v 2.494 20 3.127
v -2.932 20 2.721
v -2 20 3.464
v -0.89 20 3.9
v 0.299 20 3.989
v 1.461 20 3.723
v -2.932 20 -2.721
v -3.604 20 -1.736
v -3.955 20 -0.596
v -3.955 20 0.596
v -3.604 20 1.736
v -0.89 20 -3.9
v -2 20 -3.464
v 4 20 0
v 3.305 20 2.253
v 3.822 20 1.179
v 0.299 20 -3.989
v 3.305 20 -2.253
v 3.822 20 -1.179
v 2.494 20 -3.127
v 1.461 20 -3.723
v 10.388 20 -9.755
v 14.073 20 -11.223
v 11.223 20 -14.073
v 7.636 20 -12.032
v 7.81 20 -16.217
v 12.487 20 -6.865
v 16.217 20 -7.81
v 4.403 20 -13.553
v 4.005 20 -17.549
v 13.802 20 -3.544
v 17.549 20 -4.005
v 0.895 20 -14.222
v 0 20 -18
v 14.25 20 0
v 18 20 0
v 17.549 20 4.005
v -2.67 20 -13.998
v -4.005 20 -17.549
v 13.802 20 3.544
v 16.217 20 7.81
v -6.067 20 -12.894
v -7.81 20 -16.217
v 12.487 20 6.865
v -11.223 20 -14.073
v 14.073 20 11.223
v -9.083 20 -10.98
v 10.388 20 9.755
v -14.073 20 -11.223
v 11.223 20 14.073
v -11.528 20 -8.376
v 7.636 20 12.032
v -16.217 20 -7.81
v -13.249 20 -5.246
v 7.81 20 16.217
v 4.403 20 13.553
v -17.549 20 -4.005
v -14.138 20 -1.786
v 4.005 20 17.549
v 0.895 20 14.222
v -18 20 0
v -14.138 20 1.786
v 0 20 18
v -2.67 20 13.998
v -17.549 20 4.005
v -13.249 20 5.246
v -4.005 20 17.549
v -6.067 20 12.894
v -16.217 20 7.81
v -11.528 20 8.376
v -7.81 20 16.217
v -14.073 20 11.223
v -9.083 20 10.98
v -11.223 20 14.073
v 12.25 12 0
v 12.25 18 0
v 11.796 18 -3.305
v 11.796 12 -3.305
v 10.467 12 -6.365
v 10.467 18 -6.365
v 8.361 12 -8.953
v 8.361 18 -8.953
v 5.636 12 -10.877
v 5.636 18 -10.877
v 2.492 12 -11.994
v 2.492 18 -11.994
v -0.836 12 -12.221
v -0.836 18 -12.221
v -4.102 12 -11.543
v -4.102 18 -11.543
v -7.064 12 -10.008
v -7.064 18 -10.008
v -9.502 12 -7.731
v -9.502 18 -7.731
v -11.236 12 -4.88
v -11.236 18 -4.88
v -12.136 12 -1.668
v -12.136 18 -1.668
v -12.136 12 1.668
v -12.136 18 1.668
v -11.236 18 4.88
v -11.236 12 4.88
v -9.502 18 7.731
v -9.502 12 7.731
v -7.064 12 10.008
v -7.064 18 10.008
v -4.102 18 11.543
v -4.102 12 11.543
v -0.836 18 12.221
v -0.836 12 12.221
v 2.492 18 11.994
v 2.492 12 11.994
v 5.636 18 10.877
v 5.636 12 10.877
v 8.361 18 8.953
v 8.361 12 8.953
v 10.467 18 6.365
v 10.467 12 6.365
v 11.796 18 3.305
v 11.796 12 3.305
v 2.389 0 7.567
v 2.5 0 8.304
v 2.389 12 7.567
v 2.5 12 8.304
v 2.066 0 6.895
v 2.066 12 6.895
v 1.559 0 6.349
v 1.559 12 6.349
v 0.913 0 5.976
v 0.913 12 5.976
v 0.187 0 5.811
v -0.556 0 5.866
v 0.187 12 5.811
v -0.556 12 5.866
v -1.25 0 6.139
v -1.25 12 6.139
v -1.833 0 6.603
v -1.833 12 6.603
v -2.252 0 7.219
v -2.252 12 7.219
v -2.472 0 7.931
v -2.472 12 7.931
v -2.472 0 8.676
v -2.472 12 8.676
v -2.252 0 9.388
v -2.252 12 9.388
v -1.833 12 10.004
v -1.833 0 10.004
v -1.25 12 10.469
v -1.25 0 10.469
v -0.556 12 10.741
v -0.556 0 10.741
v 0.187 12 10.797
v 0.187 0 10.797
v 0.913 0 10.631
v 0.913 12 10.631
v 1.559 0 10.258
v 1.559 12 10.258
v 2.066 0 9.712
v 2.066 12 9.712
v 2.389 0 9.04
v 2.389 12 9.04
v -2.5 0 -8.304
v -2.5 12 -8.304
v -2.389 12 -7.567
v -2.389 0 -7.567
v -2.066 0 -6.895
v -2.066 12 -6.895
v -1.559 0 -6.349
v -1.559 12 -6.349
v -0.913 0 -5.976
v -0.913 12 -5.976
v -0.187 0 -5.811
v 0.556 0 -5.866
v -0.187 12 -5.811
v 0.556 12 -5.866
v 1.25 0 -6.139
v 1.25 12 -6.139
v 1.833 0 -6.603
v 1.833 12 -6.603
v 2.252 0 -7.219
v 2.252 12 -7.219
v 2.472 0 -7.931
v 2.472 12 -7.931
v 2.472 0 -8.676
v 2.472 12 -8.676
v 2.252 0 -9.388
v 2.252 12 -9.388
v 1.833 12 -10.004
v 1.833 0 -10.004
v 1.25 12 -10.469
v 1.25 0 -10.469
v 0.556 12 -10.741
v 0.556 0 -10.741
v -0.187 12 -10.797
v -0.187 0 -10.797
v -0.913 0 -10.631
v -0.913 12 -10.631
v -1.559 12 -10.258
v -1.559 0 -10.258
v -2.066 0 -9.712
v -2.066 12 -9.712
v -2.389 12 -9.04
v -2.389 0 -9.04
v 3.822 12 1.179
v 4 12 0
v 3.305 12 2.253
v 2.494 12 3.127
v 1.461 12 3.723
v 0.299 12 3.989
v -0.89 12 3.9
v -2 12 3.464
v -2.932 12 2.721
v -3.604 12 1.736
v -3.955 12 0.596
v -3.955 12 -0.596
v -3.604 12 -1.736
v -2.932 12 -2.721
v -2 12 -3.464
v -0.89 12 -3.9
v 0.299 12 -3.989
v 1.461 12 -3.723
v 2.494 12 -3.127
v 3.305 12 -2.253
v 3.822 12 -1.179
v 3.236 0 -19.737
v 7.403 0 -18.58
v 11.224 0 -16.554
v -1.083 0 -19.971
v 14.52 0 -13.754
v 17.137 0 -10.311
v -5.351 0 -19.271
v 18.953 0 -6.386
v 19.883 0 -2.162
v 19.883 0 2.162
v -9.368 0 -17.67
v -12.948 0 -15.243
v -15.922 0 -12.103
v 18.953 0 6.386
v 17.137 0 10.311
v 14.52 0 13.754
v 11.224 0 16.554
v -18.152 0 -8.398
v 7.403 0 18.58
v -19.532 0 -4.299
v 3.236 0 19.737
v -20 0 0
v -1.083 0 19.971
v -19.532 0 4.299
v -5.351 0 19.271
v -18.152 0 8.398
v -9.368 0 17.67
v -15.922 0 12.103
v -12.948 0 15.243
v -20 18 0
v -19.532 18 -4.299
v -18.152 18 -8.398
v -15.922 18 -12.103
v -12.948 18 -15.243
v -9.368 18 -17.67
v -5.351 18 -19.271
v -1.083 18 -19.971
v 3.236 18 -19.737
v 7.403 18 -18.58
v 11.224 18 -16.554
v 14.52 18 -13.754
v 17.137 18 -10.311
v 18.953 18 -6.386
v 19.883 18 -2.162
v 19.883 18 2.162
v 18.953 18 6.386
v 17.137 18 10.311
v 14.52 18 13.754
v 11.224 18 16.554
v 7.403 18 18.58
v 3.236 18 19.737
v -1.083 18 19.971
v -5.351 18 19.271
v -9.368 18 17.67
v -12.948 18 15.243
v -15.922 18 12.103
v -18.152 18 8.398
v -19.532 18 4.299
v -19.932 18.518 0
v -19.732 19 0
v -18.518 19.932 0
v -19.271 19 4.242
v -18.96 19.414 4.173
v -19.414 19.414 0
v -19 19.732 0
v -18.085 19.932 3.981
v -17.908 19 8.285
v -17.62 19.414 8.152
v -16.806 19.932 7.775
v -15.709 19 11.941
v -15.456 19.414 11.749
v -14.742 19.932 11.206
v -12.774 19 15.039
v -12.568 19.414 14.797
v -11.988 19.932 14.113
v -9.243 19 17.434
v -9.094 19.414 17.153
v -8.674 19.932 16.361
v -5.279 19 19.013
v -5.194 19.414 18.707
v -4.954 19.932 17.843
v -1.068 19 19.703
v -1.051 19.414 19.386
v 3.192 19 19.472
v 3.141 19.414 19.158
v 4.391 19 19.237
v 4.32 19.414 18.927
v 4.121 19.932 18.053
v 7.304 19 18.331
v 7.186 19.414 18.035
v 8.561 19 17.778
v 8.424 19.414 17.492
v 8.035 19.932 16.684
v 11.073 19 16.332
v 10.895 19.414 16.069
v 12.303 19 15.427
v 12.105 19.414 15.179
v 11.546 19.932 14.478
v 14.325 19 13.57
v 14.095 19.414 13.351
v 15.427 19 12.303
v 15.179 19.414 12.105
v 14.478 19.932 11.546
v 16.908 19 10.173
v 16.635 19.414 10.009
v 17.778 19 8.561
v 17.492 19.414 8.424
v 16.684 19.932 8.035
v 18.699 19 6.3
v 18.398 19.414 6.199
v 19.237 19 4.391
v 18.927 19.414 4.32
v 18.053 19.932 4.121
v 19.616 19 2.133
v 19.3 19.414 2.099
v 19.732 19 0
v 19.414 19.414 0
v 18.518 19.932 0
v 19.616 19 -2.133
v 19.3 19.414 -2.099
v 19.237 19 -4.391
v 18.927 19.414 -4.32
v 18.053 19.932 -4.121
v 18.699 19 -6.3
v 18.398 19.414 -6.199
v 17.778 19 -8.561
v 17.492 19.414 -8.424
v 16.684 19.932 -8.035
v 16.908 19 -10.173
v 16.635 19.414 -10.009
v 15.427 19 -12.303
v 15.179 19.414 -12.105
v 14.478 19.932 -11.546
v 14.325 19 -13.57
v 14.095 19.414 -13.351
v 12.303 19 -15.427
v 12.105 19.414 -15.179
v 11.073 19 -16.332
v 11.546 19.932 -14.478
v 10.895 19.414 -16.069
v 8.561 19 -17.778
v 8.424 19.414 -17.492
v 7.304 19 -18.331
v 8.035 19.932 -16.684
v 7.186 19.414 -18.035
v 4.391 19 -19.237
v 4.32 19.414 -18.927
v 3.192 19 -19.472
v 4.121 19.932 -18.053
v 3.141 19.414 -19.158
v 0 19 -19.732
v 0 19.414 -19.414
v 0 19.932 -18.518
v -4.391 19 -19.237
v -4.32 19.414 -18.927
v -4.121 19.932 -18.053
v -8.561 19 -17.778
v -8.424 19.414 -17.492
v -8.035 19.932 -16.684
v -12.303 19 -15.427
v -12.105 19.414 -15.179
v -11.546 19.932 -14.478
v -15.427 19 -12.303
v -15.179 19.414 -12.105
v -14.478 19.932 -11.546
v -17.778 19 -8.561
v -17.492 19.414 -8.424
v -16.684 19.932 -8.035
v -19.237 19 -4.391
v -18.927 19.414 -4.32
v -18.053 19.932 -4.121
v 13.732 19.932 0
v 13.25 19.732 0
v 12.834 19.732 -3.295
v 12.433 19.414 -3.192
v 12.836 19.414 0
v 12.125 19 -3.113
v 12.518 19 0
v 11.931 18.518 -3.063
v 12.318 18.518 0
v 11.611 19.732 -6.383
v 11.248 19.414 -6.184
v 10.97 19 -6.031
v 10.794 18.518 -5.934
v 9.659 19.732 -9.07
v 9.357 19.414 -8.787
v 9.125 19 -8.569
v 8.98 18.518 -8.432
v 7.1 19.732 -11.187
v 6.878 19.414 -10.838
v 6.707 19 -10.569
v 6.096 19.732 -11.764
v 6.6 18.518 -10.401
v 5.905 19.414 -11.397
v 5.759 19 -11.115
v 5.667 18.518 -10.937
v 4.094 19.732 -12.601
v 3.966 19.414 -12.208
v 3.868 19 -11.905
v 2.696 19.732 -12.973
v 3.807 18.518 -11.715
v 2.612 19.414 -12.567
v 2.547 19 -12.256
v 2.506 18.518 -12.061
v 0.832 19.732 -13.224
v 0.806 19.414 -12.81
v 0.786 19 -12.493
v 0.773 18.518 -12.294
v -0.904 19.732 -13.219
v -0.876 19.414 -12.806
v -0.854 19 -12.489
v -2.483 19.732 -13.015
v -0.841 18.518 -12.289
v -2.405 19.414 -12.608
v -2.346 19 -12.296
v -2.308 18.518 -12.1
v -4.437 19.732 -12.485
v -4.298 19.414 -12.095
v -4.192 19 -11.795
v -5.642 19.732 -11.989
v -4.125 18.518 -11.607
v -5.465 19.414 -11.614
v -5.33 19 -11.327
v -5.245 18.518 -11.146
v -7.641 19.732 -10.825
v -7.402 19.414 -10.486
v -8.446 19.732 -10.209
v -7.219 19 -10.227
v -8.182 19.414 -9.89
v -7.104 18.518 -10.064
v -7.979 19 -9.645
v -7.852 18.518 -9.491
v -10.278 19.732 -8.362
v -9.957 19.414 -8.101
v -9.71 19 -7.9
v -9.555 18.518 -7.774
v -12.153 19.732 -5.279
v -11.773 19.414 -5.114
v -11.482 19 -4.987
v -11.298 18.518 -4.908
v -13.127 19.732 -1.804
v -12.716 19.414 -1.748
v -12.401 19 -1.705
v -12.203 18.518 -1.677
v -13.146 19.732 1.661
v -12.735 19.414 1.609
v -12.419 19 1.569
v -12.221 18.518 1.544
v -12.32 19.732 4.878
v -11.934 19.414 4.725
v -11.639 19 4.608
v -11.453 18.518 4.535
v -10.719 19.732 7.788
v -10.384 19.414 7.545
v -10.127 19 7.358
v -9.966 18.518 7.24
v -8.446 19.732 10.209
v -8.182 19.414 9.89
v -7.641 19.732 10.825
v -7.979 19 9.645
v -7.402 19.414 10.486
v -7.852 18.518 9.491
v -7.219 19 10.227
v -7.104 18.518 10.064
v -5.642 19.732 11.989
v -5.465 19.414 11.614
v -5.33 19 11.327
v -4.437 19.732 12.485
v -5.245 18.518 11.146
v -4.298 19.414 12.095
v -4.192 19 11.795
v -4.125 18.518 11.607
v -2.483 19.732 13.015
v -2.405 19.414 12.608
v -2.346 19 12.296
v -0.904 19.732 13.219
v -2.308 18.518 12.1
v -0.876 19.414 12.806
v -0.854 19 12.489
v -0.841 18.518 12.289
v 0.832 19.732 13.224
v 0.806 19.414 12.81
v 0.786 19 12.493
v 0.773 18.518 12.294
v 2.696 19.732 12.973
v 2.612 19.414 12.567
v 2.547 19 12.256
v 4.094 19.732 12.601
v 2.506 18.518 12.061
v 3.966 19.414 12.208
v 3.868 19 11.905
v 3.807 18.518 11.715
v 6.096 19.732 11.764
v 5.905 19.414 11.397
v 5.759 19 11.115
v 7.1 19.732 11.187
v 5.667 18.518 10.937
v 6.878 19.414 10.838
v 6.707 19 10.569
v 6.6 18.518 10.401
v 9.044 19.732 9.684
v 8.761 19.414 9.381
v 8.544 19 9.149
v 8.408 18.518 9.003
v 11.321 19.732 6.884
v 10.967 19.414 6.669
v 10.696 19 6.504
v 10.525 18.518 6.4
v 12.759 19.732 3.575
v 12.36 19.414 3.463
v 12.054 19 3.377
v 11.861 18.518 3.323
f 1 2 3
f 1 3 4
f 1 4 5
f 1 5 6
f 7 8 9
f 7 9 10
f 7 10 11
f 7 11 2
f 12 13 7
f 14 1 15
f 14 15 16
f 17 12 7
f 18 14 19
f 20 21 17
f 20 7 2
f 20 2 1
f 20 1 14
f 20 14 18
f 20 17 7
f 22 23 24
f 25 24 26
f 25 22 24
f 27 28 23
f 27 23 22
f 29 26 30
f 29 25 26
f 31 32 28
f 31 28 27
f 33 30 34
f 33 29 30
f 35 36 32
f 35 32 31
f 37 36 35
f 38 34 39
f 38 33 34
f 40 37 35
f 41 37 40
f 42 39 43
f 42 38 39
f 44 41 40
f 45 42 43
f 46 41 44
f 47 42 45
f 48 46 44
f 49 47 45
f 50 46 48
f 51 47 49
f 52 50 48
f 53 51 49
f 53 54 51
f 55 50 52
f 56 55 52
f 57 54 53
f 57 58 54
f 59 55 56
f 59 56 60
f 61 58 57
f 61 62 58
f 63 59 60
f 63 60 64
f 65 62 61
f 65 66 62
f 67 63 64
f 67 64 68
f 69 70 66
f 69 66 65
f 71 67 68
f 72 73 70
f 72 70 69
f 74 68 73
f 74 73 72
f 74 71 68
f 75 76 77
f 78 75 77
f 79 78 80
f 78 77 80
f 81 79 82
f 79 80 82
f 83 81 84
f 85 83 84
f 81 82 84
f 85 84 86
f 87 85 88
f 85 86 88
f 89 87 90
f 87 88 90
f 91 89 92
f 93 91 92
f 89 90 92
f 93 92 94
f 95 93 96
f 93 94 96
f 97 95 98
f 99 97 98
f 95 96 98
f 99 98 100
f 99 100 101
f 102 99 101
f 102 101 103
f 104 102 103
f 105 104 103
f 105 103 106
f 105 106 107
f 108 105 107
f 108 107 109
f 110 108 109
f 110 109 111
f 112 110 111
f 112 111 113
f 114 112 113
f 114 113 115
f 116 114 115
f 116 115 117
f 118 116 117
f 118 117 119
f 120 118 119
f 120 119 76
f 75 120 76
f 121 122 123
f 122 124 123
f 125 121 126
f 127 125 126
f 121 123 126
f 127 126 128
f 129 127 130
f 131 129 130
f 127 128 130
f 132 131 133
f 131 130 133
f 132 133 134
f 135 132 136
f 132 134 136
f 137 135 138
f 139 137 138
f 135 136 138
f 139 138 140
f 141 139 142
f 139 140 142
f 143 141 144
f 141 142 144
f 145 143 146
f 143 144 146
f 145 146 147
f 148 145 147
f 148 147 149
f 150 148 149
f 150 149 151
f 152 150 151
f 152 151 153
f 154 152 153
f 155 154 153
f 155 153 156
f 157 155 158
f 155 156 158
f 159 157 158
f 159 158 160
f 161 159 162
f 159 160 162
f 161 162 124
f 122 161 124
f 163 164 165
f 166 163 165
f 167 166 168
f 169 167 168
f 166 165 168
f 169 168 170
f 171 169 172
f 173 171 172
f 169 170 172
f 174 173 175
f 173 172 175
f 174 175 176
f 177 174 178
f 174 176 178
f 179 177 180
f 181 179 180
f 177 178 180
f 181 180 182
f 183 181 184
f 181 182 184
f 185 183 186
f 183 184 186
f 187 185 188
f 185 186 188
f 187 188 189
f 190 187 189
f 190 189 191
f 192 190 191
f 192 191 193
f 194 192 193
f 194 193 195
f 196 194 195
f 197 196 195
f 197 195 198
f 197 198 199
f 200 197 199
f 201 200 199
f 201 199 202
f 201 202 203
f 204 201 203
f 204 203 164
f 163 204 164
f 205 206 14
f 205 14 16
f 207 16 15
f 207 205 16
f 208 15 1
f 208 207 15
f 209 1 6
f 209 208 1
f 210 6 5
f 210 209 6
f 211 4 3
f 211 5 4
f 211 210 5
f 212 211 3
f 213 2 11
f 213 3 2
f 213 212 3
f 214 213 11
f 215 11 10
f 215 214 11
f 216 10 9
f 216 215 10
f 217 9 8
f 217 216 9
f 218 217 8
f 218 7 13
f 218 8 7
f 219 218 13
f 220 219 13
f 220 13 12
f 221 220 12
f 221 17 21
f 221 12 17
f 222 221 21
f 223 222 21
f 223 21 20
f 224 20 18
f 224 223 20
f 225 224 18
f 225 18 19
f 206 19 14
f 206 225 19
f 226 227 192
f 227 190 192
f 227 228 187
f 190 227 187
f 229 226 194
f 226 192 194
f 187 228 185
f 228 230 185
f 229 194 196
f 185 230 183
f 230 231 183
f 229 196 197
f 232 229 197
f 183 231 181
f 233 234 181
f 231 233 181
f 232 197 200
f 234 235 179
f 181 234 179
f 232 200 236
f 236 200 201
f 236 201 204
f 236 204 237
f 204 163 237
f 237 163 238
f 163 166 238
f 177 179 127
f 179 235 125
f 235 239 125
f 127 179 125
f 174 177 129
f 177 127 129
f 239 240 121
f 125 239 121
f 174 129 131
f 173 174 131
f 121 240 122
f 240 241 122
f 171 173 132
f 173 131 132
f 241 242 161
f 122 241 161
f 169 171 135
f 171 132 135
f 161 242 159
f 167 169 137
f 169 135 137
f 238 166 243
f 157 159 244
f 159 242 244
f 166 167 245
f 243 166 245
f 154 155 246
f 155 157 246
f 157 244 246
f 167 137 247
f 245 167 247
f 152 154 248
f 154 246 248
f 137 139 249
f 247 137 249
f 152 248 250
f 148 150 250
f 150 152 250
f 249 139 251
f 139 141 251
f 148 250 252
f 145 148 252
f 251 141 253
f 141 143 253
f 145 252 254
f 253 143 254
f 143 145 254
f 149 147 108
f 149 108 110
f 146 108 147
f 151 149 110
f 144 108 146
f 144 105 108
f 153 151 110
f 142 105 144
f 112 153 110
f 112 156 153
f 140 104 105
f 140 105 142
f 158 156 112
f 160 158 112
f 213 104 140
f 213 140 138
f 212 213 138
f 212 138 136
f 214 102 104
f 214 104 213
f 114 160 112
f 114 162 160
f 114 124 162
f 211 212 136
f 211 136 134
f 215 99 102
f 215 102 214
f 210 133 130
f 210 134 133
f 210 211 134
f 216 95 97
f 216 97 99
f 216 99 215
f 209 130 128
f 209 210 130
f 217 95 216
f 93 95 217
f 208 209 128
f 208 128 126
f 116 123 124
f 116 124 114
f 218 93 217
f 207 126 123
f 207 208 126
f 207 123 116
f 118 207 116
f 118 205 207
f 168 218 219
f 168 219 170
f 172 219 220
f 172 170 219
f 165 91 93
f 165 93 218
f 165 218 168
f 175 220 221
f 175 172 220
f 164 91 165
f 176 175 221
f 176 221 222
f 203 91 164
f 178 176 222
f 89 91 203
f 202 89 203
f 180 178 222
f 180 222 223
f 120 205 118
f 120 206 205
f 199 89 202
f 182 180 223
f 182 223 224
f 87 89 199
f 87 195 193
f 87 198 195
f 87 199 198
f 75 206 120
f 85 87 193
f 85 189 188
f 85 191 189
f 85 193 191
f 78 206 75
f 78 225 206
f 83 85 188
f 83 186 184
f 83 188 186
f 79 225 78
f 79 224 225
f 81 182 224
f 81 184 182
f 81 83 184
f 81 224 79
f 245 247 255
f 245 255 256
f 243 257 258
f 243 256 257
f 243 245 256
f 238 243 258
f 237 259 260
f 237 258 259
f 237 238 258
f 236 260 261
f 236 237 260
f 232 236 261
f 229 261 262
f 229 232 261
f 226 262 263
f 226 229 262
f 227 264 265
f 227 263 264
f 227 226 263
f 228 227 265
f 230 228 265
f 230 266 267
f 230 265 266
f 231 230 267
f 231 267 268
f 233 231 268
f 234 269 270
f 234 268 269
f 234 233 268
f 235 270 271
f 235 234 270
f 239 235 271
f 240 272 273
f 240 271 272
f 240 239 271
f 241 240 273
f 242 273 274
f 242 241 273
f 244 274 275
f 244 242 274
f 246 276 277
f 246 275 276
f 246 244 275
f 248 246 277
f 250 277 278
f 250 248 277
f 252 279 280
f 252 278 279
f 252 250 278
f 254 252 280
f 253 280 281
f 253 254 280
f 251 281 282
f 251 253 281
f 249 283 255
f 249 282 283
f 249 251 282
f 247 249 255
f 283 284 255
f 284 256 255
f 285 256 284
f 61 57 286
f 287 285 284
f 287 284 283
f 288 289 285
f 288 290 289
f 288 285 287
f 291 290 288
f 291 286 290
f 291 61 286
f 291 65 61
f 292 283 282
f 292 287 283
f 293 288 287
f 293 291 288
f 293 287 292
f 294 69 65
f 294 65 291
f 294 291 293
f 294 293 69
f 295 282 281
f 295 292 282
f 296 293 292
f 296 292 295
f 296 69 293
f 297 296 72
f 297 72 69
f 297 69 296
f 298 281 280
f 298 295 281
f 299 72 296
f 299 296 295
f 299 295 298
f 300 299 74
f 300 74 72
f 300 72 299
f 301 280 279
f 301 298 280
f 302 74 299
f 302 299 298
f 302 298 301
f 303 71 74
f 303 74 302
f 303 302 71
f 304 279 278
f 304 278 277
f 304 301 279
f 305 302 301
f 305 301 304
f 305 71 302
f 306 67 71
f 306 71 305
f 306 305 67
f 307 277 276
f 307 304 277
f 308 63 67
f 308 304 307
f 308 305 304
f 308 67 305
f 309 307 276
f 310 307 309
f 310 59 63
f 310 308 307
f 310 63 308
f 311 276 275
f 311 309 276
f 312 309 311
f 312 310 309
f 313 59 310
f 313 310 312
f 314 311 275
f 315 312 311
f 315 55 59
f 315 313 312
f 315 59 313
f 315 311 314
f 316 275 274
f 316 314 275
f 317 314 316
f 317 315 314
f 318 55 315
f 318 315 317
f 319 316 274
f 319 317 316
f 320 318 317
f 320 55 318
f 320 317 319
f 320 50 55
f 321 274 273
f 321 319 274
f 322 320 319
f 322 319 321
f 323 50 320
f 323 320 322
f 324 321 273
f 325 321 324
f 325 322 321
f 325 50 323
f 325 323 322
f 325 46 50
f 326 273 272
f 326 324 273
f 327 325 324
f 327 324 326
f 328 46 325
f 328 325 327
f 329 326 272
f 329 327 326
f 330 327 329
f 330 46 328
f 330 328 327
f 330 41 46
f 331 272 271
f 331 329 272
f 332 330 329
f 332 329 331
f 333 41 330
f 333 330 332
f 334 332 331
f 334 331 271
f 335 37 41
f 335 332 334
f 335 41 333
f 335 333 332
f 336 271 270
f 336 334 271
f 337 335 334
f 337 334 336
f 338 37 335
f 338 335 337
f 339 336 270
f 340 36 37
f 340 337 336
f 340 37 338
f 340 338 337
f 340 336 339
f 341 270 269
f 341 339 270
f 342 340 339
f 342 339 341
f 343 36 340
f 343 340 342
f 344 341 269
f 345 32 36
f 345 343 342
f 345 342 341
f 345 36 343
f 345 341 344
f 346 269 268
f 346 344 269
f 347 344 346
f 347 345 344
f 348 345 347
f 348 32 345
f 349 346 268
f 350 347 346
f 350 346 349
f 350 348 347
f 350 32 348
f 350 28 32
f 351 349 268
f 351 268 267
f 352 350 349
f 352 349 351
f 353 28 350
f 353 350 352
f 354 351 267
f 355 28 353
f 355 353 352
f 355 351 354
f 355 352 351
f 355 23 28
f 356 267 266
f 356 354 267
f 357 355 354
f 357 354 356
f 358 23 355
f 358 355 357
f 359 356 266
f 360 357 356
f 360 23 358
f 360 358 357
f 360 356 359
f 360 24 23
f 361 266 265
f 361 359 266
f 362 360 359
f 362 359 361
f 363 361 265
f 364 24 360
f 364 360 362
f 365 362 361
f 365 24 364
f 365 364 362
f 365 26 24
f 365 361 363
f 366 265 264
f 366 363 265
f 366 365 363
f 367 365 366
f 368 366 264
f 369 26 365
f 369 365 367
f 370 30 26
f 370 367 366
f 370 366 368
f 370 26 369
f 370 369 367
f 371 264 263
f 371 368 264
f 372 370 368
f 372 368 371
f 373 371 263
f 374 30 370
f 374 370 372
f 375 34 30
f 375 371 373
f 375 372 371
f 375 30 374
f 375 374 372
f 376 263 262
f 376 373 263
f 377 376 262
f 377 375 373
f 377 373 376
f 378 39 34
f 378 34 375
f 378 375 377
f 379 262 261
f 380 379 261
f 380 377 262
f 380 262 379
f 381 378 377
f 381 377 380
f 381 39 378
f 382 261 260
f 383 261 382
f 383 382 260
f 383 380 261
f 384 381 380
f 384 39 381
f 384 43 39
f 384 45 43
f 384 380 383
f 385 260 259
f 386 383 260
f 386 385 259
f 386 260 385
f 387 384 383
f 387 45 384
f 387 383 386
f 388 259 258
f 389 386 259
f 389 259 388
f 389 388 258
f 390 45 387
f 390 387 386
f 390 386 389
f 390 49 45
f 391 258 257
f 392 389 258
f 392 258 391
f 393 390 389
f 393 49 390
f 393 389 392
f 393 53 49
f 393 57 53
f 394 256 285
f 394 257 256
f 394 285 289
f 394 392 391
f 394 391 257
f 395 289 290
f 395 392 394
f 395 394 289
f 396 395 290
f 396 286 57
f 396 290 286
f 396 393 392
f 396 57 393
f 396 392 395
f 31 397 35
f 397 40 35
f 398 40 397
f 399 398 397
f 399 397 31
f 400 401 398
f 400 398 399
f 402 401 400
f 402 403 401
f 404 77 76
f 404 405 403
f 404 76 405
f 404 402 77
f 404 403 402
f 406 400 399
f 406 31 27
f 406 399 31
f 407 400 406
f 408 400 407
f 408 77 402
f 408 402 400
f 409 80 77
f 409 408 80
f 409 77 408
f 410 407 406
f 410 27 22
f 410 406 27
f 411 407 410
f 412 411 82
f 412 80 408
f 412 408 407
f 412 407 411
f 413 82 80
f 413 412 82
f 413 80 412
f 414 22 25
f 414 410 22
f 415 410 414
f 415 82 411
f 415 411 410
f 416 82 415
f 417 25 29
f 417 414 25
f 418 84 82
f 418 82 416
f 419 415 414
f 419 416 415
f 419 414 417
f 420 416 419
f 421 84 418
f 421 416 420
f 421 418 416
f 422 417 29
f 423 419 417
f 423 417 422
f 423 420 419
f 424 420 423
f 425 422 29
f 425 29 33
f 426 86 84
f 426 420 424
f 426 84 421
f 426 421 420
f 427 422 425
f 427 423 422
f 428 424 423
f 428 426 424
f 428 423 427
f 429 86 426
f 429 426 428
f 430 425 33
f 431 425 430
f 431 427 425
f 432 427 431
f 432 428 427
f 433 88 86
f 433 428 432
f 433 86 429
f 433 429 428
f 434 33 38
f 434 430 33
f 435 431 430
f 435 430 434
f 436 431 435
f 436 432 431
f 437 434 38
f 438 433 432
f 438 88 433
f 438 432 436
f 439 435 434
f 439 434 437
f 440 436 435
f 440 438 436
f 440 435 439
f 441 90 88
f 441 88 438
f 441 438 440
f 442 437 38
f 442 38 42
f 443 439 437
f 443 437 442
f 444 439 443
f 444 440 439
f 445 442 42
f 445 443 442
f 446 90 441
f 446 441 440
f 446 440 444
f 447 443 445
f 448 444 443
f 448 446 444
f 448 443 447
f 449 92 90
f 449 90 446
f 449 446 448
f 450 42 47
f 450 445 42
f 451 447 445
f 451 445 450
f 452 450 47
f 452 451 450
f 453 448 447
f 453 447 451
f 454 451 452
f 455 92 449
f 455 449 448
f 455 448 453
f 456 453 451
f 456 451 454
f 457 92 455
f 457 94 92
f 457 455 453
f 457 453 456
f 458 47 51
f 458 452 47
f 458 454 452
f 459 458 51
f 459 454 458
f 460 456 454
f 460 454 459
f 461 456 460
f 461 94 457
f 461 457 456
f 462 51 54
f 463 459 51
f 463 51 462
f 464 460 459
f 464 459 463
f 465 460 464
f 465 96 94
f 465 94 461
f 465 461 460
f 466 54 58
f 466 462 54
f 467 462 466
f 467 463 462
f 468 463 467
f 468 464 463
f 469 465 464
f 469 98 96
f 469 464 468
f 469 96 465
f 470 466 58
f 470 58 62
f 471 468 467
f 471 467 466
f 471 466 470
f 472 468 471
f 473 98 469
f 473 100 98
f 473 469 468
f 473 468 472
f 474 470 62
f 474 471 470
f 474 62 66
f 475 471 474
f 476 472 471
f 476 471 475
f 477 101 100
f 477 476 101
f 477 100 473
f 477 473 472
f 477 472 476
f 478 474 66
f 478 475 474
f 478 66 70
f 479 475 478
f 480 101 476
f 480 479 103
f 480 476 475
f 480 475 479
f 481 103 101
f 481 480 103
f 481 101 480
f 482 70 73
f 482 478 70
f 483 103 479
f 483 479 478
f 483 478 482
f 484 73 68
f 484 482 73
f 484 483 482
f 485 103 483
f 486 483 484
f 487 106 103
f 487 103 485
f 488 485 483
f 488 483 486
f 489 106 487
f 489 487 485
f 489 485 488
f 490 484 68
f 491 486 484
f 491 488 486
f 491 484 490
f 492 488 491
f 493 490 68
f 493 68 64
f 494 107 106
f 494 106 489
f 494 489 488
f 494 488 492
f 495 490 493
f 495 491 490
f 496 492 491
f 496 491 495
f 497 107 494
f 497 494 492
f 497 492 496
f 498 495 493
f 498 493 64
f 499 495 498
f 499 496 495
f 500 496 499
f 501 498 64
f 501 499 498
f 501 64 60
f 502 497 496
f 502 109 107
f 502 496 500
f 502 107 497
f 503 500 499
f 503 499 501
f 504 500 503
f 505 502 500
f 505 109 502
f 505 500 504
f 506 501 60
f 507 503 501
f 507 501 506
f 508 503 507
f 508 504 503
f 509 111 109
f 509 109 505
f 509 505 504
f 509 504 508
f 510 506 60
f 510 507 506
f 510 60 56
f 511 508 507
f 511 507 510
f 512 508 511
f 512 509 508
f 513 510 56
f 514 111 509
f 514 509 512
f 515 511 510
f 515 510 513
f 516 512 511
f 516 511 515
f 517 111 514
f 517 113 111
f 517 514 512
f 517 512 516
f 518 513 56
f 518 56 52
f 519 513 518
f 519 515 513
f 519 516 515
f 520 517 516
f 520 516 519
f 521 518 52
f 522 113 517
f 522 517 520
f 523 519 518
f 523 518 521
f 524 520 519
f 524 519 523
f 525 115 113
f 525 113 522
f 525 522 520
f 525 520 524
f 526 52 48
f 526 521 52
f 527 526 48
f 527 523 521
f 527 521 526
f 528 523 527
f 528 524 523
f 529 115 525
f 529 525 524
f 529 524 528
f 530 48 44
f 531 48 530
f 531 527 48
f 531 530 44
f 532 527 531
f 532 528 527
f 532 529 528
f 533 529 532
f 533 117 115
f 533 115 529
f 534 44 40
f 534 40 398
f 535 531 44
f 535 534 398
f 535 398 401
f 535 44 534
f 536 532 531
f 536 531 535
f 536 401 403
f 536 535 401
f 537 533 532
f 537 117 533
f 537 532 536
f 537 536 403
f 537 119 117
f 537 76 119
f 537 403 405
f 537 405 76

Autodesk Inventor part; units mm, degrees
ref_plane "YZ Plane" through (0, 0, 0) normal (1, 0, 0) x (0, 1, 0)
ref_plane "XZ Plane" through (0, 0, 0) normal (0, 1, 0) x (-1, 0, 0)
ref_plane "XY Plane" through (0, 0, 0) normal (0, 0, 1) x (1, 0, 0)
sketch "Sketch1" plane through (0, 0, 0) normal (0, 1, 0) x (-1, 0, 0)
  circle A0 centre (0, 0) radius 20
  dimension "d0" = 40
extrude "Extrusion1" add sketch "Sketch1" along normal blind 20
sketch "Sketch2" plane through (0, 20, 0) normal (0, 1, 0) x (1, 0, 0)
  circle A0 centre (0, 0) radius 12.25
  dimension "d3" = 24.5
extrude "Extrusion2" cut sketch "Sketch2" against normal blind 8
fillet "Fillet1" radius 2 2 edges at (20, 20, 0) (-12.25, 20, 0)
sketch "Sketch3" plane through (0, 12, 0) normal (0, 1, 0) x (1, 0, 0)
  circle A0 centre (0, 0) radius 4
  dimension "d7" = 8
extrude "Extrusion3" add sketch "Sketch3" along normal blind 8
sketch "Sketch4" plane through (0, 12, 0) normal (0, 1, 0) x (1, 0, 0)
  circle A0 centre (0, -8.3036) radius 2.5
  point P0 (0, 0)
  dimension "d10" = 5
extrude "Extrusion4" cut sketch "Sketch4" against normal blind 15
pattern_circular "Circular Pattern1" count 2 over 360 about axis through (0, -10, 0) along (0, 1, 0) of "Extrusion4"
properties part number "PruebaRodamiento"
